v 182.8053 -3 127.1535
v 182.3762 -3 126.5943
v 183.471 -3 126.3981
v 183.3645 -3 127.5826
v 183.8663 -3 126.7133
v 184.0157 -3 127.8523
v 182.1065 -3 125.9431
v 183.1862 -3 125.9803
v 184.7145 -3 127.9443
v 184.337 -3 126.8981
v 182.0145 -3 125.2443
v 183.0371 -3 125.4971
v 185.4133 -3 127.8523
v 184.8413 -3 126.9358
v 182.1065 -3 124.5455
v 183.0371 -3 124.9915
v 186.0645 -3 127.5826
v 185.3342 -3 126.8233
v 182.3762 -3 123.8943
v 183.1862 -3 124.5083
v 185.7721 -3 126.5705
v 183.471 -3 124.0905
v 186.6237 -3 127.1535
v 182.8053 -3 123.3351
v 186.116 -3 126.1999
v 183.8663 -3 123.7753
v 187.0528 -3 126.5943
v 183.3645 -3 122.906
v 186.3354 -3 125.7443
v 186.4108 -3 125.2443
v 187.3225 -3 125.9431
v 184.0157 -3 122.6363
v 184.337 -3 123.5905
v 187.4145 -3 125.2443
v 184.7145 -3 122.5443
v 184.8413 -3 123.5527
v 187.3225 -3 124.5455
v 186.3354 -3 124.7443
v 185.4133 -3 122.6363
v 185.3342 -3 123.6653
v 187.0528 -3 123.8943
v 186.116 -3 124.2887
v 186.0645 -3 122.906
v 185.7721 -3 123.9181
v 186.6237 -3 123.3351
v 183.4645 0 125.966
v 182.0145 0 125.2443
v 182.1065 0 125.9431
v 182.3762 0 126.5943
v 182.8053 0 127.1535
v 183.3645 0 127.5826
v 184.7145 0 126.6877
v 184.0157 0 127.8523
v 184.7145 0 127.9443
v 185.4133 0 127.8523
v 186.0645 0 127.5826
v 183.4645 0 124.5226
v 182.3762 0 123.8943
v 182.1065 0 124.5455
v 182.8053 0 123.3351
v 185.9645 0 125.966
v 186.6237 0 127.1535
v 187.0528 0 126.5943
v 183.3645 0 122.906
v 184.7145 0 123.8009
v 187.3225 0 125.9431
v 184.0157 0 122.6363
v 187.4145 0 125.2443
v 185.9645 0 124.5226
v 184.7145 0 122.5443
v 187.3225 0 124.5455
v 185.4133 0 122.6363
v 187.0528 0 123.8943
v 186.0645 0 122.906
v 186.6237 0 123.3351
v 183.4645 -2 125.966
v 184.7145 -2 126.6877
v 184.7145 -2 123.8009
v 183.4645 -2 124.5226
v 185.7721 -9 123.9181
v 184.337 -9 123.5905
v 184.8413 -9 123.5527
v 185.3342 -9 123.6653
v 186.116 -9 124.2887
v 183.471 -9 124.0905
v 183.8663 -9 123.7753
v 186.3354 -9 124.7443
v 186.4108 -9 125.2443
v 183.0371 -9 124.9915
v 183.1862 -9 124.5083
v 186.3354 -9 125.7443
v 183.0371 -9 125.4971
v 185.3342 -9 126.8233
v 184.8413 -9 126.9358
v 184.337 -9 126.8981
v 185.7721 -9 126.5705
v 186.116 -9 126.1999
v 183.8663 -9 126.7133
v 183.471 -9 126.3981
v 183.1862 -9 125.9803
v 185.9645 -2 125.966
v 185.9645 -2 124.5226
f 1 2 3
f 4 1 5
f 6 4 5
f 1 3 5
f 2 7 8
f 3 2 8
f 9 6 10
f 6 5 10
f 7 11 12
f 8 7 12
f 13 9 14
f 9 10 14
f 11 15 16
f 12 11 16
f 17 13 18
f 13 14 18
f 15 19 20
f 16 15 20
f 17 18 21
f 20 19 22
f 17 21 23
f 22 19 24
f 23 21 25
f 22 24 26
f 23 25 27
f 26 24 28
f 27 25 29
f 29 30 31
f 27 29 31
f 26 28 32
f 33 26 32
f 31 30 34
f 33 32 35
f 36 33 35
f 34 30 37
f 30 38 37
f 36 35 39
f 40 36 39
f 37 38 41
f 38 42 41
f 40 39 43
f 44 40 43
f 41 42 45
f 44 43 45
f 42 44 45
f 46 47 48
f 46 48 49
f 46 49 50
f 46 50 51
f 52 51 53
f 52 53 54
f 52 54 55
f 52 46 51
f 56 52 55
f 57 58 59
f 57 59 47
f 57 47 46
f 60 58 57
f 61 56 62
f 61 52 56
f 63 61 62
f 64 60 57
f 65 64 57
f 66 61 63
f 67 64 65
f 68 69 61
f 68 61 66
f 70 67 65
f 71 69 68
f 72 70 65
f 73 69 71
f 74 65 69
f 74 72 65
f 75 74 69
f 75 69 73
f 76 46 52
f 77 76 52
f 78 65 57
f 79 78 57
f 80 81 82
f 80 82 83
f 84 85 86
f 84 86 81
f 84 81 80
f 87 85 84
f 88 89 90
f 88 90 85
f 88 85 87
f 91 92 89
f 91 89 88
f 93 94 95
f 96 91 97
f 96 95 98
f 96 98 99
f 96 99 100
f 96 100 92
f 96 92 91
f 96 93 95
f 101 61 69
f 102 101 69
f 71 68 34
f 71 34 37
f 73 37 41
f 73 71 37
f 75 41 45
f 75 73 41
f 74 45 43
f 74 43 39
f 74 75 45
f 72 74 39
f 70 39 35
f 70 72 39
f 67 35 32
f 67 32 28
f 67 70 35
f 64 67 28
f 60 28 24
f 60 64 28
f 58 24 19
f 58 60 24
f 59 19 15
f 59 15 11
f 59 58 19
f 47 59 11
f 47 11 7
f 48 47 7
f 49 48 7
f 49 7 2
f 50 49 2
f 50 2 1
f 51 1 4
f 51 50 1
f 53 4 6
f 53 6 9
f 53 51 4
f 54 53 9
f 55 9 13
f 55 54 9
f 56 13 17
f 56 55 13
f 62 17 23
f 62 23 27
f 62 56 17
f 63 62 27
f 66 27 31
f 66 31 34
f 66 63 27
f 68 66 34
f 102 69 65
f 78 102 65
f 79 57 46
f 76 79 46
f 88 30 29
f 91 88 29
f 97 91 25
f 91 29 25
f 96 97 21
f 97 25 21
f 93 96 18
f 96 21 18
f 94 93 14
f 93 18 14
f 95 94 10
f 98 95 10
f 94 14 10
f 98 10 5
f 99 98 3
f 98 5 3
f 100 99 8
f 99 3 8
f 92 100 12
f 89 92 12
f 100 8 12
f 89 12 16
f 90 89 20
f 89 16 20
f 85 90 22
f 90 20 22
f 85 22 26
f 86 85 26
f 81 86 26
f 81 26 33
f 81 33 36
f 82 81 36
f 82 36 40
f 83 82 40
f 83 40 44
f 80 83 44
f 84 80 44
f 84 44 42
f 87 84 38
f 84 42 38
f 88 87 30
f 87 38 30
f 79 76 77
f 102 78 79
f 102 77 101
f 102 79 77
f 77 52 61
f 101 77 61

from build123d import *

# Parameters (mm, degrees)
SKETCH1_R           = 2.7
BOSS_EXTRUDE1_DEPTH = 3
SKETCH2_R           = 1.696293742
BOSS_EXTRUDE2_DEPTH = 6
CUT_EXTRUDE1_DEPTH  = 2


with BuildPart() as part:
    # Sketch1 → Boss-Extrude1 (new body)
    with BuildSketch(Plane(origin=(0, 0, 0), x_dir=(1, 0, 0), z_dir=(0, 1, 0))):
        with Locations((184.714490272, -125.24429514)):
            Circle(SKETCH1_R)
    extrude(amount=-BOSS_EXTRUDE1_DEPTH)

    # Sketch2 → Boss-Extrude2 (add)
    with BuildSketch(Plane.XZ.offset(3)):
        with Locations((184.714490272, 125.24429514)):
            Circle(SKETCH2_R)
    extrude(amount=BOSS_EXTRUDE2_DEPTH)

    # Sketch3 → Cut-Extrude1 (cut)
    with BuildSketch(Plane(origin=(0, 0, 0), x_dir=(1, 0, 0), z_dir=(0, 1, 0))):
        Polygon((184.714490272, -123.800919467), (183.464490272, -124.522607304), (183.464490272, -125.965982977), (184.714490272, -126.687670813), (185.964490272, -125.965982977), (185.964490272, -124.522607304), align=None)
    extrude(amount=-CUT_EXTRUDE1_DEPTH, mode=Mode.SUBTRACT)


solid = part.part
